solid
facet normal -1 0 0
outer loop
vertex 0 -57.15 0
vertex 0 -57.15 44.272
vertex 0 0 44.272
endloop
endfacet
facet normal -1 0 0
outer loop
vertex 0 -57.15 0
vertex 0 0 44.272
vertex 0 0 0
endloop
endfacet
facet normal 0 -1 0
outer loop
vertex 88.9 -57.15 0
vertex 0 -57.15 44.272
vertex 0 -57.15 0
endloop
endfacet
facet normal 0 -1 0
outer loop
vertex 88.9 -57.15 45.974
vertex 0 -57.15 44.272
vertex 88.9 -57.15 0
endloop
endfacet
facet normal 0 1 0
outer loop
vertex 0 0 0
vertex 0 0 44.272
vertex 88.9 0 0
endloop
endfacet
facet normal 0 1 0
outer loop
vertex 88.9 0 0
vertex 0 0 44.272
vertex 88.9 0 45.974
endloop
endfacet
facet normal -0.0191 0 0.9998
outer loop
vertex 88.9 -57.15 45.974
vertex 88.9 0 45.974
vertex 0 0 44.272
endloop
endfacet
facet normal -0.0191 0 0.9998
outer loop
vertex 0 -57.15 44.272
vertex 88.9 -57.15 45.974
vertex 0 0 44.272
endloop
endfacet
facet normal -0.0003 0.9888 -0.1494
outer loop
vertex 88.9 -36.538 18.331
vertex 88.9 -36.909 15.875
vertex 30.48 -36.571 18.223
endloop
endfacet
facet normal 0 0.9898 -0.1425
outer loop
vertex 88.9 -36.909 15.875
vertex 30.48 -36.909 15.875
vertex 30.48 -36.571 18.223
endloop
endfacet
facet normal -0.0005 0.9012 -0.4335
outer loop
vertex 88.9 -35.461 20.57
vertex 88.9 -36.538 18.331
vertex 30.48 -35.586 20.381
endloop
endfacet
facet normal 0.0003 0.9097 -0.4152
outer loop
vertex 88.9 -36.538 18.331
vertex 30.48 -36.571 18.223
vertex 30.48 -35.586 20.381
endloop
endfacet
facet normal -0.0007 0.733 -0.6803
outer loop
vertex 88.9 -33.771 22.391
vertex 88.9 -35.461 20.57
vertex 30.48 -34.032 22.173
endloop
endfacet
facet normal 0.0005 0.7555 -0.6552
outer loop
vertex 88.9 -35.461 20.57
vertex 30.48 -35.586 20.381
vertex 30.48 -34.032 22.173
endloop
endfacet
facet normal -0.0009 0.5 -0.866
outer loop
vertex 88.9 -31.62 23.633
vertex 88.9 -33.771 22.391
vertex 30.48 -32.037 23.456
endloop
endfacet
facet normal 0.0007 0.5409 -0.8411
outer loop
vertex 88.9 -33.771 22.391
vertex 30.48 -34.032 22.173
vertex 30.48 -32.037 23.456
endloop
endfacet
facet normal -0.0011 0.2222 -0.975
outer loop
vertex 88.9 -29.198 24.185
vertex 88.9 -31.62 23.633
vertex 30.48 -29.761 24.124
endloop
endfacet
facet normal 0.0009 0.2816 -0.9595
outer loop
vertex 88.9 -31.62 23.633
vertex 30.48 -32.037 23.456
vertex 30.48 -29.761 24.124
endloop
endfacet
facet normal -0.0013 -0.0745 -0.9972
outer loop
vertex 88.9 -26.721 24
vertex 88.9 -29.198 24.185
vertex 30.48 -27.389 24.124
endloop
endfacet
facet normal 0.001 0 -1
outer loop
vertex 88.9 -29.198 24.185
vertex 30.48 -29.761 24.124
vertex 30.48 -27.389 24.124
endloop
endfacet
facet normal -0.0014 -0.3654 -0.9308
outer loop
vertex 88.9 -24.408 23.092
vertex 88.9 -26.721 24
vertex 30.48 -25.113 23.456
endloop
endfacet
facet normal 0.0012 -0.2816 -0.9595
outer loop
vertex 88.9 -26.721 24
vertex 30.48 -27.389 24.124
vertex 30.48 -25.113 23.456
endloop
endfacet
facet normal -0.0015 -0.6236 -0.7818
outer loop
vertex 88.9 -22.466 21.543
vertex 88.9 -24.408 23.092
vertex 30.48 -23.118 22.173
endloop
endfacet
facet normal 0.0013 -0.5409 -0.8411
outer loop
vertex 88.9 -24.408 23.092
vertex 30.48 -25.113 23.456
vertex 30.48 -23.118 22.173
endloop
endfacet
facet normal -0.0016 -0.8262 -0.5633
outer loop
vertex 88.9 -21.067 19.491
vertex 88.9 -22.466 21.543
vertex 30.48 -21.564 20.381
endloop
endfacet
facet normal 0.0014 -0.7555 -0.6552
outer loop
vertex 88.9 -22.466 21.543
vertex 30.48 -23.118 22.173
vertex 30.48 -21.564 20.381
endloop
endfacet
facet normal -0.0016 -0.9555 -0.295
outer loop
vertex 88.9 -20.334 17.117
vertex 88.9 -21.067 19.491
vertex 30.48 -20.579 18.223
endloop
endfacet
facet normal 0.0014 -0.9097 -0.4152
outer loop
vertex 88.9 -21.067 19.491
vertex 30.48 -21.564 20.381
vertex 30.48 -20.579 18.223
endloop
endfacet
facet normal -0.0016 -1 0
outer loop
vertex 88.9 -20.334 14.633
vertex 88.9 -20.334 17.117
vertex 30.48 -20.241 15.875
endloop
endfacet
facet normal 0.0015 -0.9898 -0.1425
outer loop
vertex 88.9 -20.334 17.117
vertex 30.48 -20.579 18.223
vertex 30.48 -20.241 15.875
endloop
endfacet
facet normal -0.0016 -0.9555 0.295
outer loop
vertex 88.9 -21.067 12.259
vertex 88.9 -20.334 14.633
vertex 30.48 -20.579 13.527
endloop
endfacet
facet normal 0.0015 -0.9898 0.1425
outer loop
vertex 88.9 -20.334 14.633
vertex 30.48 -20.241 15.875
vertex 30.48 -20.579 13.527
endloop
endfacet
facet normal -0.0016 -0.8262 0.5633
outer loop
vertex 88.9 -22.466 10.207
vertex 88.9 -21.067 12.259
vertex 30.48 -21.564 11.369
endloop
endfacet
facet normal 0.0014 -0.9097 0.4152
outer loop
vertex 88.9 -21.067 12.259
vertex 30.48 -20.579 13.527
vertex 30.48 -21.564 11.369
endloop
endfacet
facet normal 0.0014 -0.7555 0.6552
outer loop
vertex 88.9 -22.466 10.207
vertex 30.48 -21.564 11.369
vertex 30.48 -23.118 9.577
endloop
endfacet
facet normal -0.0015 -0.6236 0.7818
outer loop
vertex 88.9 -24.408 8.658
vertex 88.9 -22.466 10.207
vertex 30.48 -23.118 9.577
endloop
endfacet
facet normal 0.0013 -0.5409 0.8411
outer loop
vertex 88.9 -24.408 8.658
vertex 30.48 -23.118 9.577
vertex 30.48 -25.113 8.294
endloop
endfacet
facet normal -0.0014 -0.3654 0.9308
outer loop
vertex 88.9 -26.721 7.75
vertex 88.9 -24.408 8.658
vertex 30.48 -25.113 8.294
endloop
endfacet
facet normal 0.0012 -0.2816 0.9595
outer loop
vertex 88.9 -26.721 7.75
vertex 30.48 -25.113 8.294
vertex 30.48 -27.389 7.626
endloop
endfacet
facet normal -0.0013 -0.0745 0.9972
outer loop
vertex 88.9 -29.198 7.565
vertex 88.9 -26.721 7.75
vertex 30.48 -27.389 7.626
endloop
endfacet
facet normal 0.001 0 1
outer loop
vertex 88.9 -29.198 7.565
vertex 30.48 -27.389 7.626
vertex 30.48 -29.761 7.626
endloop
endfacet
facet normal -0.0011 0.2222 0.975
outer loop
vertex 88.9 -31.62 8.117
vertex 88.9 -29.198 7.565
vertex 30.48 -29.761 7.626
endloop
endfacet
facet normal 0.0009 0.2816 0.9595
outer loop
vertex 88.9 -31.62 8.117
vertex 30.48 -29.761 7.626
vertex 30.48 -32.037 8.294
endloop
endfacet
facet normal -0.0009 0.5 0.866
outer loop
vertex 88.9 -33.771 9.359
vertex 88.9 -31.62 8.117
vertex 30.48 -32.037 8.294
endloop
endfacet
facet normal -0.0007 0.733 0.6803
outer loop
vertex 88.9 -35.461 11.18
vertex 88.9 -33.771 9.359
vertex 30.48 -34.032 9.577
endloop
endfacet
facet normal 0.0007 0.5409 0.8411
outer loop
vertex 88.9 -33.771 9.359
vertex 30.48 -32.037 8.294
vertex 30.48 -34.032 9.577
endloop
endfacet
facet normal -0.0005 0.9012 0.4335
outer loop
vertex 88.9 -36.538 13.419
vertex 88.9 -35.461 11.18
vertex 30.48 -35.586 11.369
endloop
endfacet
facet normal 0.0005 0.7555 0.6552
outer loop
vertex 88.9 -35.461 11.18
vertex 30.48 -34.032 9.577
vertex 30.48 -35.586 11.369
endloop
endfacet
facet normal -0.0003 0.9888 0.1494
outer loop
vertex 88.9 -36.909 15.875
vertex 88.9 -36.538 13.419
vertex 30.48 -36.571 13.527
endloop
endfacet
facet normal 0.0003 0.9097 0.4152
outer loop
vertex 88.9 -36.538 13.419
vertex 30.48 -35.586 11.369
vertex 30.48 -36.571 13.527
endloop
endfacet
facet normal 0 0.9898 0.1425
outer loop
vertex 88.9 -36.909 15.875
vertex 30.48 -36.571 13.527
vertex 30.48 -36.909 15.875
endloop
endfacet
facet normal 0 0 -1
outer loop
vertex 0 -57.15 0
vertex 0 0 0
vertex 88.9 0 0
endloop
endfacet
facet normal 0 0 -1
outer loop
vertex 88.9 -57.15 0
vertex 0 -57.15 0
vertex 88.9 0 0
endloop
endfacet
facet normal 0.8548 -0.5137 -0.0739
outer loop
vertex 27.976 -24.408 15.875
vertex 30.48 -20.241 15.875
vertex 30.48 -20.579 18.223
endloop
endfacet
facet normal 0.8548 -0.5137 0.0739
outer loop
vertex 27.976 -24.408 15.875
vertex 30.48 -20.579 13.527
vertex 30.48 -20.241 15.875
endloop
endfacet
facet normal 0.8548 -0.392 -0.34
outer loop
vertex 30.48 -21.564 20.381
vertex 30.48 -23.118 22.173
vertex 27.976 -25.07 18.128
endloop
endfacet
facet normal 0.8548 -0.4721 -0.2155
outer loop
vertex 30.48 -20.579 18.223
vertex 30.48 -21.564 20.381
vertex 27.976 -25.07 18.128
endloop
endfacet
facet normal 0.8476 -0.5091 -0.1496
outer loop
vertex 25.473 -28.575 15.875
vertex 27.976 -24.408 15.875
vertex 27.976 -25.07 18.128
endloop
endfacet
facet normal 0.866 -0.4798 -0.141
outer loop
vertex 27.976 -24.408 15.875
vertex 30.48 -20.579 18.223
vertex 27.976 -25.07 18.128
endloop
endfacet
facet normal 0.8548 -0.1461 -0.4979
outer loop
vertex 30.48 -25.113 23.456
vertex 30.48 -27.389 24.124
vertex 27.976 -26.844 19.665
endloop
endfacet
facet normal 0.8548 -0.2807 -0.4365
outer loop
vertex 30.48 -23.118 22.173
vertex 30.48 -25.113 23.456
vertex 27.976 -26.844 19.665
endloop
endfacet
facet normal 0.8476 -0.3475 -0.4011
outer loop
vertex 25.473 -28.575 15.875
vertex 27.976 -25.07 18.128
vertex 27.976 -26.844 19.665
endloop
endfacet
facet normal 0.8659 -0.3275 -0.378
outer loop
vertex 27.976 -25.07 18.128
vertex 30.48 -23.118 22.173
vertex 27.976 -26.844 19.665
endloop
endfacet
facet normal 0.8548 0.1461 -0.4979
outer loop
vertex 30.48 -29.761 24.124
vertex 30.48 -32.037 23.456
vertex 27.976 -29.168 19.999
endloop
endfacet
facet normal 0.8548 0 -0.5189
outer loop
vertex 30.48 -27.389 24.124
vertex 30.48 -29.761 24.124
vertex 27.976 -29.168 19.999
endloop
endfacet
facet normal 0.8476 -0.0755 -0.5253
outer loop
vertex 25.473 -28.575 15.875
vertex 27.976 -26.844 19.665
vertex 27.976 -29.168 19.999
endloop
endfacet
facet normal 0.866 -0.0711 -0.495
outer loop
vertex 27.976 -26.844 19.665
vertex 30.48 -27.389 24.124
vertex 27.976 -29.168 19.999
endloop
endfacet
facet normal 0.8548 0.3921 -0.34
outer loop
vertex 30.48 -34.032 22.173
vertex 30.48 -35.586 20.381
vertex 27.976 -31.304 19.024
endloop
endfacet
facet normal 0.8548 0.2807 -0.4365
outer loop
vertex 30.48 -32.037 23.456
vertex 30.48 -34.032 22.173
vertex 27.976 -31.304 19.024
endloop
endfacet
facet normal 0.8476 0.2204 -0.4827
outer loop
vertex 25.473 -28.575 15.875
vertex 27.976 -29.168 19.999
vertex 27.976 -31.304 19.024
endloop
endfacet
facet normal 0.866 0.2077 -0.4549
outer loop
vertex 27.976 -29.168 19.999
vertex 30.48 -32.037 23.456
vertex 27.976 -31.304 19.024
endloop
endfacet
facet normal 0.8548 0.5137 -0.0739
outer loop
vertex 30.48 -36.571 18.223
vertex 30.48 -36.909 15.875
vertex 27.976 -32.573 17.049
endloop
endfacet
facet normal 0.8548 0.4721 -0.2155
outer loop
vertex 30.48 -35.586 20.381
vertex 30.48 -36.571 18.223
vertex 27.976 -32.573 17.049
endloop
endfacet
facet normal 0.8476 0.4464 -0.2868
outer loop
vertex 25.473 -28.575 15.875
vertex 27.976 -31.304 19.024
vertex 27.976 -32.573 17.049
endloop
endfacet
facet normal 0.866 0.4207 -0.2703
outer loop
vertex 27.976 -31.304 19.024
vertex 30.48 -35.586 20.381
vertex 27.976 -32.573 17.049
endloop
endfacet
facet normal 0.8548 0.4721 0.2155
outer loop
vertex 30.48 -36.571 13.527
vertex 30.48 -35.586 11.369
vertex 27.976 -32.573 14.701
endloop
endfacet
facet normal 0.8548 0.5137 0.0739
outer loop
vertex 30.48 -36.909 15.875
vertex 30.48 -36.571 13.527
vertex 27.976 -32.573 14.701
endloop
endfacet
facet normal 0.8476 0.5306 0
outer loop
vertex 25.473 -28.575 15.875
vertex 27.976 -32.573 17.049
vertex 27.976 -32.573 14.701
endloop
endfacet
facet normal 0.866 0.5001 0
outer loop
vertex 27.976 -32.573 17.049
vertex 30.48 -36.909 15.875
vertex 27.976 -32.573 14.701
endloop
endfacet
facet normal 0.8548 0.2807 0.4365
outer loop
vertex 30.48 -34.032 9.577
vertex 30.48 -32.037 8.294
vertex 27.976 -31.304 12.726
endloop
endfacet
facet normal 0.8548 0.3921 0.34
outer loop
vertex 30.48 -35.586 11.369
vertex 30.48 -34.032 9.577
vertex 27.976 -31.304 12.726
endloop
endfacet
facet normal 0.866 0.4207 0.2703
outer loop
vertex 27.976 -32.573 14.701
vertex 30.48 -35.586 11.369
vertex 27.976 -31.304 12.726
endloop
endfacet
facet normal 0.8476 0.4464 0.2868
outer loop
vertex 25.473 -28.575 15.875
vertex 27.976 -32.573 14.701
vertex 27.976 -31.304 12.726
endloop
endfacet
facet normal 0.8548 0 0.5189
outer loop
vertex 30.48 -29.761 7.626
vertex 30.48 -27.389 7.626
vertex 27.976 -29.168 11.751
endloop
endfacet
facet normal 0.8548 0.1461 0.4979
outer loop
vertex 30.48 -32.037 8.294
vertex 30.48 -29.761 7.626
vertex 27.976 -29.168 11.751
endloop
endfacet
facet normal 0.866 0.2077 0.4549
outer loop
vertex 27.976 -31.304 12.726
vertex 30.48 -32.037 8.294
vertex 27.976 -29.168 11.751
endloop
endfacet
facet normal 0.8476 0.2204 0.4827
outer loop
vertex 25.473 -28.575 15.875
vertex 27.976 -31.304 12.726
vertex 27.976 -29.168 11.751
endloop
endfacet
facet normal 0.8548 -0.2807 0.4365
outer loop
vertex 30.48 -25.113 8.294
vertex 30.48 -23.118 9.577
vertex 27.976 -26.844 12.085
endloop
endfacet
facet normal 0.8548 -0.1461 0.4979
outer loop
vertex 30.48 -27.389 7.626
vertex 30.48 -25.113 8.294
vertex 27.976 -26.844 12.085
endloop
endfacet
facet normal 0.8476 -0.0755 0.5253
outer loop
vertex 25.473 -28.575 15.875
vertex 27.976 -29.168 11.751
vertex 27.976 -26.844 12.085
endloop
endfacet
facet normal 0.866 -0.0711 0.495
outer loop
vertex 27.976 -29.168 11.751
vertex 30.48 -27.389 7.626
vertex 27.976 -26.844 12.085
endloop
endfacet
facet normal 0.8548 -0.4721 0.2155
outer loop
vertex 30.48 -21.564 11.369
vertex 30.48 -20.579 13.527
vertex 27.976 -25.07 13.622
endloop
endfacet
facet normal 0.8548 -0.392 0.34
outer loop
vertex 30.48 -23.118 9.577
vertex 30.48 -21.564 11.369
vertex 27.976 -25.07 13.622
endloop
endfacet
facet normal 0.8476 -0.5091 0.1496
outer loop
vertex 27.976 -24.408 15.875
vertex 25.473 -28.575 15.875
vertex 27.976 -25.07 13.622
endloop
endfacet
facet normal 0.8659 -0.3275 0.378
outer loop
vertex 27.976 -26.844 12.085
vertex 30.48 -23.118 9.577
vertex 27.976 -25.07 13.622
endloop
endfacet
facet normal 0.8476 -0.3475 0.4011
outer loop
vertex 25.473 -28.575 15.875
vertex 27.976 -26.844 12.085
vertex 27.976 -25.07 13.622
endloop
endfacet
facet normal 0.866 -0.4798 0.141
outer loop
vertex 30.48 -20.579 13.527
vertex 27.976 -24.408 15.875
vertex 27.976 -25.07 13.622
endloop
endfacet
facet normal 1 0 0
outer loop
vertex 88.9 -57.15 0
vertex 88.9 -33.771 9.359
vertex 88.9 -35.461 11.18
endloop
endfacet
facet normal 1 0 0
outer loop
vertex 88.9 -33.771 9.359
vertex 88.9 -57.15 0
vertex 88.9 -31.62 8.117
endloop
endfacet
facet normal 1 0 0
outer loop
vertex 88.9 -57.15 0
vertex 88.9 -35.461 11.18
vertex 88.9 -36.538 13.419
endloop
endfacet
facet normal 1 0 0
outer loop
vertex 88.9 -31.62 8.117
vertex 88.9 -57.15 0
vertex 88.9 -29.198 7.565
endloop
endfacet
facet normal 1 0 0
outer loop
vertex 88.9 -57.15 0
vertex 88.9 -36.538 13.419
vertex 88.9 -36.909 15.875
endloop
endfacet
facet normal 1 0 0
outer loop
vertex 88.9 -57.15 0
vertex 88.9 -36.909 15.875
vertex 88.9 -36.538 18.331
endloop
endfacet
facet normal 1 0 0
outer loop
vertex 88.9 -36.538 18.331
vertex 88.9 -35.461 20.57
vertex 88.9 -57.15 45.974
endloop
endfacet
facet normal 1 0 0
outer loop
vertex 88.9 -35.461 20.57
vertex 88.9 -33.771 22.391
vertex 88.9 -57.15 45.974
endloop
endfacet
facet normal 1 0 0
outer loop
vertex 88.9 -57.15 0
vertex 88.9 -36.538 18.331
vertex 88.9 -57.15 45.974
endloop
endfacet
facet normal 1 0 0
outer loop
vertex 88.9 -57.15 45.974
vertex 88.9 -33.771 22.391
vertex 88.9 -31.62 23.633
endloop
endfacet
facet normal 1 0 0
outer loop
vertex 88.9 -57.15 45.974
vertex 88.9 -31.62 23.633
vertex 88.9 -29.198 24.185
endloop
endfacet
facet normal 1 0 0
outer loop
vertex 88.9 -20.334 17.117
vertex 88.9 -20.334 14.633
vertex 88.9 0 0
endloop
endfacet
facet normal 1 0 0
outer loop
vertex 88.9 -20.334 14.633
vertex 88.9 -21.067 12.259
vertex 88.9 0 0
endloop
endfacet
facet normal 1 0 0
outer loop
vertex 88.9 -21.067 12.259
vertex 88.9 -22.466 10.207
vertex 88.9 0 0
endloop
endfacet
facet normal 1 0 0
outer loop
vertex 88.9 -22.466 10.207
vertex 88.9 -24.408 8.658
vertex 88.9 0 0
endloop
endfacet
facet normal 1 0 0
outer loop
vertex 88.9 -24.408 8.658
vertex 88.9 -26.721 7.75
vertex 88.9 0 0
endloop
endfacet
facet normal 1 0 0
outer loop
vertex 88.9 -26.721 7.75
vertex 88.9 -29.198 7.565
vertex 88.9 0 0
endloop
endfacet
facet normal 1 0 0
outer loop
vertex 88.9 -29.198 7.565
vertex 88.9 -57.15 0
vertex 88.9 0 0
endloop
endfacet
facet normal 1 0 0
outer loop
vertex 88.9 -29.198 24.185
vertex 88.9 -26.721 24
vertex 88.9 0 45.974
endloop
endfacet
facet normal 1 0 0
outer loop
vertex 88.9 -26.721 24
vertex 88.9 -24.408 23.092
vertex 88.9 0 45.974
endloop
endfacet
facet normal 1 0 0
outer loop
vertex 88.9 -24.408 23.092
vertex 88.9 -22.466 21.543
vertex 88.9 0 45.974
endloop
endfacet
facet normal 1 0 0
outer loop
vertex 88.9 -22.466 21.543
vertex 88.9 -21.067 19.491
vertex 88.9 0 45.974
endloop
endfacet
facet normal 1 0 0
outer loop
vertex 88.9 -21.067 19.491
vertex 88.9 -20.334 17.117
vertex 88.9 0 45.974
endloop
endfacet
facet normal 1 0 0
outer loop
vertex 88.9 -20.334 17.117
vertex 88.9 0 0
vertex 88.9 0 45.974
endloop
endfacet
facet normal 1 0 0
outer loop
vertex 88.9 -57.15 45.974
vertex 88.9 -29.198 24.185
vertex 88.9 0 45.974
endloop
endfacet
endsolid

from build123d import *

# Parameters (mm, degrees)
F1_DEPTH = 57.15
F3_D     = 16.66748
F3_DEPTH = 58.42
F3_TIP   = 5.0074161752


with BuildPart() as f1:
    # F0 (on Front) → F1 (new body)
    with BuildSketch(Plane.XZ):
        Polygon((0, 44.2722), (0, 0), (88.9, 0), (88.9, 45.974), align=None)
    extrude(amount=F1_DEPTH)

    # F3
    with Locations(Plane.YZ.offset(88.9)):
        with Locations((-28.575, 15.875)):
            Hole(F3_D / 2, depth=F3_DEPTH)
            with Locations((0, 0, -(F3_DEPTH + F3_TIP / 2))):  # 118° drill point
                Cone(0, F3_D / 2, F3_TIP, mode=Mode.SUBTRACT)


solid = f1.part
